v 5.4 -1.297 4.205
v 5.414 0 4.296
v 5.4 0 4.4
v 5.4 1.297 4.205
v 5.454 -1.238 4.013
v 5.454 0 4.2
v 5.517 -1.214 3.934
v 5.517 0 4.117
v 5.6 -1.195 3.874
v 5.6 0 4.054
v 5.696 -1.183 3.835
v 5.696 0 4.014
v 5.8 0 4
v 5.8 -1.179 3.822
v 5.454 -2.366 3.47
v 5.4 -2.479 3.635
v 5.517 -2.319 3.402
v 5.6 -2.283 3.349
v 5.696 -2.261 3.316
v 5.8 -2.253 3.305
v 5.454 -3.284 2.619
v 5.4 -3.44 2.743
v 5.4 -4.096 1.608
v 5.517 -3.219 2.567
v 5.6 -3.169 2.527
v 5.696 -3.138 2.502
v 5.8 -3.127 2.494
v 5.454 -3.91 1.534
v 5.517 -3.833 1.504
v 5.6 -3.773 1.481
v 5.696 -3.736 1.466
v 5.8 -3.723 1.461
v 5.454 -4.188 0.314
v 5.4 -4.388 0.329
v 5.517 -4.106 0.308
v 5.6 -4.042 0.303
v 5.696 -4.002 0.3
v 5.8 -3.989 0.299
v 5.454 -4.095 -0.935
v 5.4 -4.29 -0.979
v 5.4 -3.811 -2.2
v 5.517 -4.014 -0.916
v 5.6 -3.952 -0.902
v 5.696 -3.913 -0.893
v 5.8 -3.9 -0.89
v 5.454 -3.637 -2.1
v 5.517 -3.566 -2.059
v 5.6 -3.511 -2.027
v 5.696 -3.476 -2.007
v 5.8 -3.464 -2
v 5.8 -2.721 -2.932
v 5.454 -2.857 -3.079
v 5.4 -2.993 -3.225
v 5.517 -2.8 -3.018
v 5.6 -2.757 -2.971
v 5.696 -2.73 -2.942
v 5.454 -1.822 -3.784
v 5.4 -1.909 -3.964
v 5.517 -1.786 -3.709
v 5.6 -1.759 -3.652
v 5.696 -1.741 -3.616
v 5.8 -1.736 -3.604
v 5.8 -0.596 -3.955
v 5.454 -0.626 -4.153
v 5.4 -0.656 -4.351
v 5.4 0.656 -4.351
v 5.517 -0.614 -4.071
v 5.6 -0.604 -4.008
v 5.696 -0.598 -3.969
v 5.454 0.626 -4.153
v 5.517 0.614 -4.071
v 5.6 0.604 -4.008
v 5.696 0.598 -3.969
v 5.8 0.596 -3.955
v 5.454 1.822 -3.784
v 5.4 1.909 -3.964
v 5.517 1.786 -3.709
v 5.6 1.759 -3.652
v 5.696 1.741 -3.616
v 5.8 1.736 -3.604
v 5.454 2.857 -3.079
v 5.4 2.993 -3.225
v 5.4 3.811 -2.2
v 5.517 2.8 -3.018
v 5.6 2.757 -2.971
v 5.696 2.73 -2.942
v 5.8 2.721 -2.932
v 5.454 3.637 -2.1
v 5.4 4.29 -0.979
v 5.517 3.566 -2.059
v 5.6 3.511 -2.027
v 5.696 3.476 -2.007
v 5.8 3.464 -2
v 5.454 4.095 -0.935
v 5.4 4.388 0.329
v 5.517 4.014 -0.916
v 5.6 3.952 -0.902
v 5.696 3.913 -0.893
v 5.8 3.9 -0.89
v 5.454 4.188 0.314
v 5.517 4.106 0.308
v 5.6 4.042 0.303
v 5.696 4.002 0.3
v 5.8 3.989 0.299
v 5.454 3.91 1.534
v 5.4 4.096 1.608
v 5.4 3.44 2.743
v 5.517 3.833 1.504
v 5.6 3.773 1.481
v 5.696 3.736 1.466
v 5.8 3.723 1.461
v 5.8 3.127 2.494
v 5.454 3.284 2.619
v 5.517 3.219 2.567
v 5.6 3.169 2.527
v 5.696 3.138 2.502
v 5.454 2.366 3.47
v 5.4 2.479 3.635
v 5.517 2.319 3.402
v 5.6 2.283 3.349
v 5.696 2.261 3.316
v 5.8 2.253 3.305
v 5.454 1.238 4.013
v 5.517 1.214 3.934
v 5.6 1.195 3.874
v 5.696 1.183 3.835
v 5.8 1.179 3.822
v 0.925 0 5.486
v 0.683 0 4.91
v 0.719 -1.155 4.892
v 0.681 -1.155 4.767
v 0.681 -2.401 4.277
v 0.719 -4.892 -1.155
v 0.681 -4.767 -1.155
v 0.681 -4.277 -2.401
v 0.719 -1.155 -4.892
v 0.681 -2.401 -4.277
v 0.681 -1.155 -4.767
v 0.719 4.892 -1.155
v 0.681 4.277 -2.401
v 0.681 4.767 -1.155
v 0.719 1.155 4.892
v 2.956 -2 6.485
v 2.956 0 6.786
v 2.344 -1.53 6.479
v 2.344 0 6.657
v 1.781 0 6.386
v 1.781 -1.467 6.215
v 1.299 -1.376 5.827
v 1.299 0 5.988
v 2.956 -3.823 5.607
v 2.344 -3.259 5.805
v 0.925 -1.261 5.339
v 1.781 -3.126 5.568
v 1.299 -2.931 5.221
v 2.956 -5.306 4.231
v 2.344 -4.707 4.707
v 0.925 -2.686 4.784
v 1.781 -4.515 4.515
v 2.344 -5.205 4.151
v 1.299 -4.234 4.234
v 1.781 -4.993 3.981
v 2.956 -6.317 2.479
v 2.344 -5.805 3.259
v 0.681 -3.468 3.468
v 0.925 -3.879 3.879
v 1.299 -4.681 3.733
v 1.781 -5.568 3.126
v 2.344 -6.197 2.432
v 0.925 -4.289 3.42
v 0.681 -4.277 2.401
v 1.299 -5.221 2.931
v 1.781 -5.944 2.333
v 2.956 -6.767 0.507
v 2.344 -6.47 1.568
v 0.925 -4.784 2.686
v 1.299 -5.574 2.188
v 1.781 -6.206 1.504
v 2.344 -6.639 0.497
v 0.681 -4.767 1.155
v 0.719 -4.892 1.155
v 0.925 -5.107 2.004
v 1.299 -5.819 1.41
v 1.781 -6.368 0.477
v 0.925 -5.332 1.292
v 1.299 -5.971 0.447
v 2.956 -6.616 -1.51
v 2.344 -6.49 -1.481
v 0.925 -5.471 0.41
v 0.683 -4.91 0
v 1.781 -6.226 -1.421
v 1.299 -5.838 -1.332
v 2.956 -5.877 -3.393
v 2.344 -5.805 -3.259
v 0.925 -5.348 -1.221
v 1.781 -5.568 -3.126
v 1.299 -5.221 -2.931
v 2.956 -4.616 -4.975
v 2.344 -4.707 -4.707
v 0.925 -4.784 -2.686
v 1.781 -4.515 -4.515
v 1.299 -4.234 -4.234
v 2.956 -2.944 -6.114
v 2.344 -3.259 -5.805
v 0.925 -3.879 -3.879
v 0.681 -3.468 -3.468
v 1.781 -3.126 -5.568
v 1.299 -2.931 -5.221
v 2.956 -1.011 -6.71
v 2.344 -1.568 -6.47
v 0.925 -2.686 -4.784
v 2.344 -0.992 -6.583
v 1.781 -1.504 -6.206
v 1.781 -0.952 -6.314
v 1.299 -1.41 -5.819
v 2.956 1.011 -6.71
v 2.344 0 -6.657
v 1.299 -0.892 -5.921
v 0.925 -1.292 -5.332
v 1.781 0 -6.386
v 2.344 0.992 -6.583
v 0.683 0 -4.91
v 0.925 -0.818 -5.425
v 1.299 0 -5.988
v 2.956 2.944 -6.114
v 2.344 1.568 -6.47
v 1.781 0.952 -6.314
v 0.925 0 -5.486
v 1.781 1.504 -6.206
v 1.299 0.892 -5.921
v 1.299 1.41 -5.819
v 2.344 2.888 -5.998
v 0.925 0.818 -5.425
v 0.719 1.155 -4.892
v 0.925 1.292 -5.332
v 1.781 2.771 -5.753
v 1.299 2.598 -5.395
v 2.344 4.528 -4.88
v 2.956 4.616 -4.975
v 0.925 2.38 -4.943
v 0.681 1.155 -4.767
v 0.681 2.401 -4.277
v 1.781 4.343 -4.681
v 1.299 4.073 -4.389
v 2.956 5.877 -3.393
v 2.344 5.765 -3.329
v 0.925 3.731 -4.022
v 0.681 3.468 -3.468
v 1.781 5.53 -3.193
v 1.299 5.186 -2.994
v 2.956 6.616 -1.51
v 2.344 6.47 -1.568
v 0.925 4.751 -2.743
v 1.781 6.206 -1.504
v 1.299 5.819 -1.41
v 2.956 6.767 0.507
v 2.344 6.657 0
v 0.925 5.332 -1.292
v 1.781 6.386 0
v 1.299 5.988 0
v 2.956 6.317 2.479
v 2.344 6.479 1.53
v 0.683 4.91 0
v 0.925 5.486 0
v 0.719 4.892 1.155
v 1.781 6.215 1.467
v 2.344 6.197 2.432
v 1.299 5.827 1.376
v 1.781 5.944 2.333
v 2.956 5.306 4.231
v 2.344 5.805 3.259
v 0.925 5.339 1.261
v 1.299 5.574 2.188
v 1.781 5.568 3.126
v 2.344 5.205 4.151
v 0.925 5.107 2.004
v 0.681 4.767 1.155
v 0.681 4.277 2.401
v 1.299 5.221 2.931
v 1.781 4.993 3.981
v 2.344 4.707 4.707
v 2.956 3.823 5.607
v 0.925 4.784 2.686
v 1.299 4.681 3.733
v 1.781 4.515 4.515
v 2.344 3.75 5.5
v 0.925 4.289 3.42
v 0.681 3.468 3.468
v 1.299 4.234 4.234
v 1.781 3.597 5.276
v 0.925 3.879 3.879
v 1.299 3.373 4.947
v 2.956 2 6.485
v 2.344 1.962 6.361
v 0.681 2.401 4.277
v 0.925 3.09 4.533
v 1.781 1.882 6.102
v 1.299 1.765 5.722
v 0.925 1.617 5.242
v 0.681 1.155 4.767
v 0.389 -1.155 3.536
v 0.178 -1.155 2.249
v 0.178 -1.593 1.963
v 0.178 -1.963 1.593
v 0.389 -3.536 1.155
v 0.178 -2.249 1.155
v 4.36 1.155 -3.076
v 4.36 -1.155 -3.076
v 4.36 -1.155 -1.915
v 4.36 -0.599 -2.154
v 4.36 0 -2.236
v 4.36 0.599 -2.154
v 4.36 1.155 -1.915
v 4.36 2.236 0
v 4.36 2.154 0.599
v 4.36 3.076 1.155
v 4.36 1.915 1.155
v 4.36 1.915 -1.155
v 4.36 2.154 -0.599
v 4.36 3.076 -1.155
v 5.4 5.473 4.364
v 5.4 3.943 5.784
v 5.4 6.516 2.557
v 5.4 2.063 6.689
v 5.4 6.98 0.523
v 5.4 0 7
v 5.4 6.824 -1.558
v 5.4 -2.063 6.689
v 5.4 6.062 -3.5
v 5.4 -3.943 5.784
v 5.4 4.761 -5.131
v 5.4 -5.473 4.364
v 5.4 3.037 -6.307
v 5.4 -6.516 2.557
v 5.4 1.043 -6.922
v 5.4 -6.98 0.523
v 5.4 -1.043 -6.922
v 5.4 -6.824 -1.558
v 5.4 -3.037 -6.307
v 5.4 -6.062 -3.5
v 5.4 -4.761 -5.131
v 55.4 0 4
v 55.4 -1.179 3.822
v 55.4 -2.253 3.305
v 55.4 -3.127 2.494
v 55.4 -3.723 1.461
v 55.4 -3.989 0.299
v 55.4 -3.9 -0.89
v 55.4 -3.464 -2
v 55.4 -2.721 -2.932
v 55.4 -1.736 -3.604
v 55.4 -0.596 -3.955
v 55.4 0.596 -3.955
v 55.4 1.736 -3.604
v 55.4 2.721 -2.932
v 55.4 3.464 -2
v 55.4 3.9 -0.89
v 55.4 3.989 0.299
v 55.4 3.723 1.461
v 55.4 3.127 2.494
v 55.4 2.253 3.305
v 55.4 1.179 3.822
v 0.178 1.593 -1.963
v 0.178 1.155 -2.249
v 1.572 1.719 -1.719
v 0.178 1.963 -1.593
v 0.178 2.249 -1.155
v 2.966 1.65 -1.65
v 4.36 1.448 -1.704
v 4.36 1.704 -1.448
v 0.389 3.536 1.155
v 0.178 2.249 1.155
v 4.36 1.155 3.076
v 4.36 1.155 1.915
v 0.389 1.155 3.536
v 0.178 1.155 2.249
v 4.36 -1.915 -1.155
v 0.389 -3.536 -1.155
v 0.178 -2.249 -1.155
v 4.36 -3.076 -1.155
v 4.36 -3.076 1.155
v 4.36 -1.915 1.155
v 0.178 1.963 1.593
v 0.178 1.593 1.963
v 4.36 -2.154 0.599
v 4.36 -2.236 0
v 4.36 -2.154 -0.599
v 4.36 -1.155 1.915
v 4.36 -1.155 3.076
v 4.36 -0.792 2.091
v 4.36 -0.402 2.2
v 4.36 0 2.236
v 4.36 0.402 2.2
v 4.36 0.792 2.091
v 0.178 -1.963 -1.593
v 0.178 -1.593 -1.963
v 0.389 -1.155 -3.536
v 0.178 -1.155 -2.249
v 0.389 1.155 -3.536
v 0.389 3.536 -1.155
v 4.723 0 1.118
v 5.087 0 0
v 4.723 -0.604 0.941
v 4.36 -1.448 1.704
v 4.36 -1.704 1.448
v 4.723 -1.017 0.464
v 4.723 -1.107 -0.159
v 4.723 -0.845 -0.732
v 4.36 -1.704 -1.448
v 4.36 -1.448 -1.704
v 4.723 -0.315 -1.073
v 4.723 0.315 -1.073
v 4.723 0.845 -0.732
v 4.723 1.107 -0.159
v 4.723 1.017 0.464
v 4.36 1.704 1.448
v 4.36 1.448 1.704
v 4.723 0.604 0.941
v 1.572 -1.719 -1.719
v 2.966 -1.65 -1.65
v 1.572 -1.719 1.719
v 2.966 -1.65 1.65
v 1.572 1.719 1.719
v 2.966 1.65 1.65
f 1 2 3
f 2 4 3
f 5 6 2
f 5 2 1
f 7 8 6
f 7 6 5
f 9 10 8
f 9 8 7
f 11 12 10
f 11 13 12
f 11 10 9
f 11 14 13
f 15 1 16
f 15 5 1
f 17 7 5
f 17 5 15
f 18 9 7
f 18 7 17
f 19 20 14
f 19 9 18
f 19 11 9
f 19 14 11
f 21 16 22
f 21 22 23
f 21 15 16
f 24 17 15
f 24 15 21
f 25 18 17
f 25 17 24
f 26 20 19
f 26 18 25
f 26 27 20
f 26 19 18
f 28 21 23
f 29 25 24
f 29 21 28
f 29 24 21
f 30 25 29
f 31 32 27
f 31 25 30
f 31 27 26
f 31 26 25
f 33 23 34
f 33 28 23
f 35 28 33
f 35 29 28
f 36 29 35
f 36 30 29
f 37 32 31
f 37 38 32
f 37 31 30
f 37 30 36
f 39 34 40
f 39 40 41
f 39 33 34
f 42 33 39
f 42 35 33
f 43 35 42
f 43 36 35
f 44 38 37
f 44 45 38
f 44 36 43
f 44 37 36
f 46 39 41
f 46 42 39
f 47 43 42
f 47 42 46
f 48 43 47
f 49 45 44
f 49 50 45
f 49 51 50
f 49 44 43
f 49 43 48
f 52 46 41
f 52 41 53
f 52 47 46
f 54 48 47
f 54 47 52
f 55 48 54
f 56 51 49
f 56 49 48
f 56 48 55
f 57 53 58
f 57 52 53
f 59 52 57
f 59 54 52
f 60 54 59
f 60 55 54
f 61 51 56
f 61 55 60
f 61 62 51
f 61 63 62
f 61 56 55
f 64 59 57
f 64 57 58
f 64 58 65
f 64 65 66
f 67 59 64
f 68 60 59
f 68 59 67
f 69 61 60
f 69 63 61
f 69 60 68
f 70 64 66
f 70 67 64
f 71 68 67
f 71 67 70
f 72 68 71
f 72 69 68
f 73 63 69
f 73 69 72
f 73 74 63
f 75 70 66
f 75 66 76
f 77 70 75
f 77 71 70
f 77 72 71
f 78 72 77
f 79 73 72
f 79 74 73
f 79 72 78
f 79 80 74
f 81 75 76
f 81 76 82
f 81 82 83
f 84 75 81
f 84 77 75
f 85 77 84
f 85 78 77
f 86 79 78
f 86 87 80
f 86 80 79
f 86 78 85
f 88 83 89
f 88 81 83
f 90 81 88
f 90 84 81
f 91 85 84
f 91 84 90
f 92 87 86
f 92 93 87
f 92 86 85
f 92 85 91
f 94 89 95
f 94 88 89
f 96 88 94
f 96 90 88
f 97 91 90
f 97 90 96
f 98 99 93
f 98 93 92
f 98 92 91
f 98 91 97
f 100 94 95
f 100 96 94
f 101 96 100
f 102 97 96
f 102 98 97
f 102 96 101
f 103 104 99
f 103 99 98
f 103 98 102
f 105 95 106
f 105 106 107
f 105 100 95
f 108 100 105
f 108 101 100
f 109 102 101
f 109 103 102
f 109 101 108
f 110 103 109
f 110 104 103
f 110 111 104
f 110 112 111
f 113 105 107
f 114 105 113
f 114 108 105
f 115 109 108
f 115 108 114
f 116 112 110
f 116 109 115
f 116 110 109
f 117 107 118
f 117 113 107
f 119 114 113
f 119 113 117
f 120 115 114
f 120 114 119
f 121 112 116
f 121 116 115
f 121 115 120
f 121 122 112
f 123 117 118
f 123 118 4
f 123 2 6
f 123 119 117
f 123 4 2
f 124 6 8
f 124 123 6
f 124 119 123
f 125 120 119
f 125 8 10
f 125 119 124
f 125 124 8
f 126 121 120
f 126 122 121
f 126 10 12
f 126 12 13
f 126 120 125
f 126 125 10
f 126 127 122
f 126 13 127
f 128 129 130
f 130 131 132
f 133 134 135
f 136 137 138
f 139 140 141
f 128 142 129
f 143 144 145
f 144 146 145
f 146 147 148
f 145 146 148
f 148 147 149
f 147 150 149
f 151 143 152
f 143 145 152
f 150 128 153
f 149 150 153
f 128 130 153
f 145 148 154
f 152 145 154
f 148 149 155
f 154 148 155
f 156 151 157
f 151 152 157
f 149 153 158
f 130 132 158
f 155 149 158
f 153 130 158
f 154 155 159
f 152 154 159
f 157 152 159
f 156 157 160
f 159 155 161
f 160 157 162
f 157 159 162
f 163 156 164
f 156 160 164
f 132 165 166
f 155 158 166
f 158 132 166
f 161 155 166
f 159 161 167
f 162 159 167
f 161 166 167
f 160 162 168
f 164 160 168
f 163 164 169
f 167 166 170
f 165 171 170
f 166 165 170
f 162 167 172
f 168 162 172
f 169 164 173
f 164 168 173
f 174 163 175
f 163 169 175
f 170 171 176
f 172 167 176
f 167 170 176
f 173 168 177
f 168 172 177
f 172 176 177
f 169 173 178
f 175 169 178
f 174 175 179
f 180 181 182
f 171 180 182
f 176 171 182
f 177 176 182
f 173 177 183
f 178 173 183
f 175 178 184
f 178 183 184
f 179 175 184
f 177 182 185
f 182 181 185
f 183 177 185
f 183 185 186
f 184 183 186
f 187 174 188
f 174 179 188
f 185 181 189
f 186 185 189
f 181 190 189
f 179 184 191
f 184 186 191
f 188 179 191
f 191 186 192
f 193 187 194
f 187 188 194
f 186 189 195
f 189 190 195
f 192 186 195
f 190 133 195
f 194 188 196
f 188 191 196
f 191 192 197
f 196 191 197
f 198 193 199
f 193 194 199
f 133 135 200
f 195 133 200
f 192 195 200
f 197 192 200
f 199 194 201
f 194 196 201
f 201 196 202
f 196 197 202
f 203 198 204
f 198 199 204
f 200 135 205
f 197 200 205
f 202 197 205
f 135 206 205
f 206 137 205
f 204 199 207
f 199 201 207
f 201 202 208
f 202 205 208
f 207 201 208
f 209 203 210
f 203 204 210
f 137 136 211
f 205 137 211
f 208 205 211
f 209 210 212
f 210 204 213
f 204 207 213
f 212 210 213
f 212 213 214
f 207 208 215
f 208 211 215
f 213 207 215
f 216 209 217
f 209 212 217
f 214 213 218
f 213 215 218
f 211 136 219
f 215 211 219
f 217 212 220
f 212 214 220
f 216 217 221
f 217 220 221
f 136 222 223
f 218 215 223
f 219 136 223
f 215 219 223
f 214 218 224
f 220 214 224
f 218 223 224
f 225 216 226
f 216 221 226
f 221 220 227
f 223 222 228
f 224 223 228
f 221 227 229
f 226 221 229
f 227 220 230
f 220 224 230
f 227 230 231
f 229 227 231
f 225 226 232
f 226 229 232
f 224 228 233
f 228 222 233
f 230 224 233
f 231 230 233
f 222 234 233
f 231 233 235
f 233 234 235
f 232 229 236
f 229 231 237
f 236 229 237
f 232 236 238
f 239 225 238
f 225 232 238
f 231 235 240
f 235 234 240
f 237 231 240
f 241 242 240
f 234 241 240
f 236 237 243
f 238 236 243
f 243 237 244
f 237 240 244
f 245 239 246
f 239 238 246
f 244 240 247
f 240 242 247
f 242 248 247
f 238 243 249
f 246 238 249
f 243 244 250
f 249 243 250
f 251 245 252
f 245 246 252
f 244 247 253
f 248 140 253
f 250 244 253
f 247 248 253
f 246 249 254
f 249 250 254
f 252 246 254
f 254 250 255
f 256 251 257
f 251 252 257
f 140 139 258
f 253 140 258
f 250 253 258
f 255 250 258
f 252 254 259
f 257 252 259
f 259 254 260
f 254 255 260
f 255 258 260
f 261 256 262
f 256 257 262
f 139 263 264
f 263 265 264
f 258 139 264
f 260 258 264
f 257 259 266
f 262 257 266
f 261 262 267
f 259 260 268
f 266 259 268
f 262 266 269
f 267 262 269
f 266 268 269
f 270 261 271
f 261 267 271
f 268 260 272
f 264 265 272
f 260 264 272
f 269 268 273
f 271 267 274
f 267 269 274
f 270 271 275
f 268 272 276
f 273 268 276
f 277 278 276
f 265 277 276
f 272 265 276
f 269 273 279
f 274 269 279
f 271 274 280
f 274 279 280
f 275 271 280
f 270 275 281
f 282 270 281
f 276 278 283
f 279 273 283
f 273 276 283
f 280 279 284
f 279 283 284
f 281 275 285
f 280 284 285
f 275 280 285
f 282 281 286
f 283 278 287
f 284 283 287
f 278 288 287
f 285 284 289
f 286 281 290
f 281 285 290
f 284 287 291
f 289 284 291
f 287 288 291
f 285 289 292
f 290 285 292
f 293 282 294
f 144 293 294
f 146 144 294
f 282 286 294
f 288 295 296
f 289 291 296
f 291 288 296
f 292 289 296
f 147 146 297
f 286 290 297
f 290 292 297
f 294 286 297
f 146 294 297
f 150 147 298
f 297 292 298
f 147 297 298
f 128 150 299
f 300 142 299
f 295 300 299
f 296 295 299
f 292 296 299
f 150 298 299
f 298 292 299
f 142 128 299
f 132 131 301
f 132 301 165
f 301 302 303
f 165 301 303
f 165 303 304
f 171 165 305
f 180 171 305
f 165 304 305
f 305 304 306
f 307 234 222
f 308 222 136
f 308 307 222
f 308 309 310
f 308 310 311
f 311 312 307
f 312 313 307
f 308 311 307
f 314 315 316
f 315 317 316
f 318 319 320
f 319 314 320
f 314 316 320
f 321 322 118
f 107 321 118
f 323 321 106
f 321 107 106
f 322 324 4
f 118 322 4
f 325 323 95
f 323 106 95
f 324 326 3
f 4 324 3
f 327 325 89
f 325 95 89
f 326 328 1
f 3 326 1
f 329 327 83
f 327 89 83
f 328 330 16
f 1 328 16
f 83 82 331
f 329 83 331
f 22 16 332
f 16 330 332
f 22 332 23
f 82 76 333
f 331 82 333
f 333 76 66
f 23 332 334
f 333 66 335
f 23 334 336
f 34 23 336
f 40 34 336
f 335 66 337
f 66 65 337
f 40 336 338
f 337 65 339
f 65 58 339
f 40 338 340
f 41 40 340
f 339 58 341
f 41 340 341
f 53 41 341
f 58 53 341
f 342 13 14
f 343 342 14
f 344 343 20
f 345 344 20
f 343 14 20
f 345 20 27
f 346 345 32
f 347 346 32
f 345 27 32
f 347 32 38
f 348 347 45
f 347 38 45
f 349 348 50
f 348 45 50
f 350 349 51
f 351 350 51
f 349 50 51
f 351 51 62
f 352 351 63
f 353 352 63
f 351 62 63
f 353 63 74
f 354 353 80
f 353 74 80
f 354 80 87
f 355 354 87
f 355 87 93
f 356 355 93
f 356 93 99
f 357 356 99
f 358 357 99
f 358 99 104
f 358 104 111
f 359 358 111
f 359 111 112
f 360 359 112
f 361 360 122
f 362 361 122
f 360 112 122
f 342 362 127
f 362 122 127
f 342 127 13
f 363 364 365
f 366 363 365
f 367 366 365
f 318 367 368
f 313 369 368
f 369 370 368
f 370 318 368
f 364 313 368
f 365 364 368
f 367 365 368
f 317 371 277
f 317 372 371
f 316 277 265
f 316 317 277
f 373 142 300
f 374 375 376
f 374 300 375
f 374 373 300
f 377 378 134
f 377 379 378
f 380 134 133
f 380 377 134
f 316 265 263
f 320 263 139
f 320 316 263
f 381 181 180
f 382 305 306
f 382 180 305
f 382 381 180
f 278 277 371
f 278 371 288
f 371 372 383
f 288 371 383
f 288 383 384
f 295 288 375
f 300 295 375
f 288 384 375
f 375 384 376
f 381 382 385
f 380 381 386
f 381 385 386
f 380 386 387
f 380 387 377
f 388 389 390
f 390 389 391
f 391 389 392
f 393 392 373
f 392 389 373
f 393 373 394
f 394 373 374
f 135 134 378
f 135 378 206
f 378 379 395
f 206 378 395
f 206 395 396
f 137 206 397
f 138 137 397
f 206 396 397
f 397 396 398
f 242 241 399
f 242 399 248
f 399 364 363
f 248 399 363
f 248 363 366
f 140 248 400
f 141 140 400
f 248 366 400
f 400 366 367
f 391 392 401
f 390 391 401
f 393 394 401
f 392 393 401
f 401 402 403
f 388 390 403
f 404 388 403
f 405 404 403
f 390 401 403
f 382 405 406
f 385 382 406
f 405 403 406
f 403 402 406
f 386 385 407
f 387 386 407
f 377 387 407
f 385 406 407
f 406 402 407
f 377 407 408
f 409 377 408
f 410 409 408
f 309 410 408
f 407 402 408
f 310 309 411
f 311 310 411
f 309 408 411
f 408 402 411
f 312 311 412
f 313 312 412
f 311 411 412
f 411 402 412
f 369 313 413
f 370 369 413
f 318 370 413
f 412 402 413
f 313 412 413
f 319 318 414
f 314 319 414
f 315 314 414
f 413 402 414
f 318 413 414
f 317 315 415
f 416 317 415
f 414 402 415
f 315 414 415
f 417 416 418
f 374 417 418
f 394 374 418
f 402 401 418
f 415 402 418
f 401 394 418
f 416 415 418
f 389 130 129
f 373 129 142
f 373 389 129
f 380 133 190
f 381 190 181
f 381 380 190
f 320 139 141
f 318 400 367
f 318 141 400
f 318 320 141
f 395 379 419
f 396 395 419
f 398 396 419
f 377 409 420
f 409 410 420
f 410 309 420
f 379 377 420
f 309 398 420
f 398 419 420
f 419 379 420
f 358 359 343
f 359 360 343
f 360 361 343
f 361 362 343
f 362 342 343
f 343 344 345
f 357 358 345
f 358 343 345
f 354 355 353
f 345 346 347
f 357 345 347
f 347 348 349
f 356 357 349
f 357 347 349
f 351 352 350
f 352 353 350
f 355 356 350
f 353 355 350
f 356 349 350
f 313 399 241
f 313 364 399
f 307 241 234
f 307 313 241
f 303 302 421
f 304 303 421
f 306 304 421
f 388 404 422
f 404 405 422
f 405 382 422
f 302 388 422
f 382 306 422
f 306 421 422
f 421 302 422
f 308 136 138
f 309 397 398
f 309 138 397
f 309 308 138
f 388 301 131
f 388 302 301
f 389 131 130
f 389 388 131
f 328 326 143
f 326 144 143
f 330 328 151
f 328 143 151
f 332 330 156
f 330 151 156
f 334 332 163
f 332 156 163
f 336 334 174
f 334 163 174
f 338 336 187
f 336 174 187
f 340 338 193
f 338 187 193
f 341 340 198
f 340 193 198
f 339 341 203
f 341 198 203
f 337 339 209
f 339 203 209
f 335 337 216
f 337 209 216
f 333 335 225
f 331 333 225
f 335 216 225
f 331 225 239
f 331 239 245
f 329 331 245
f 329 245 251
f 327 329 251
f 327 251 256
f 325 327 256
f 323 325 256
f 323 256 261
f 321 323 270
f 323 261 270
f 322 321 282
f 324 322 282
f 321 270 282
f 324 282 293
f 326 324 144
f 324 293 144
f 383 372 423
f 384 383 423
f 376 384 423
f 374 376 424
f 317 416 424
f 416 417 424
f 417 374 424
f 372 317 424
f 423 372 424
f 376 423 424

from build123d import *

# Parameters (mm, degrees)
FILLET1_R    = 0.4
RECPAT_COUNT = 2
RECPAT_ANGLE = 90


with BuildPart() as part:
    # BodySke → BaseBody (revolve)
    with BuildSketch(Plane.XY, mode=Mode.PRIVATE) as basebody_sk:
        with BuildLine():
            Line((5.4, 4), (5.4, 7))
            Line((5.4, 7), (2.956076559, 6.786184404))
            ThreePointArc((2.956076559, 6.786184404), (1.52557938, 6.199578276), (0.681056287, 4.904506975))
            ThreePointArc((0.681056287, 4.904506975), (0.171077054, 2.475784034), (0, 0))
            Line((0, 0), (55.4, 0))
            Line((55.4, 0), (55.4, 4))
            Line((55.4, 4), (5.4, 4))
        make_face()
    revolve(basebody_sk.sketch.rotate(Axis((0, 0, 0), (1, 0, 0)), 90), axis=Axis((0, 0, 0), (1, 0, 0)))

    # Fillet1
    fillet1_edges = [part.edges().sort_by_distance(p)[0] for p in [
        (5.4, 0, -4),
    ]]
    fillet(fillet1_edges, radius=FILLET1_R)

    # RecSkeTop → Recess section 0
    with BuildSketch(Plane(origin=(0, 0, 0), x_dir=(0, 0, -1), z_dir=(1, 0, 0))):
        with BuildLine():
            Line((-1.155, 5.25), (1.155, 5.25))
            Line((1.155, 5.25), (1.155, -5.25))
            Line((1.155, -5.25), (-1.155, -5.25))
            Line((-1.155, -5.25), (-1.155, 5.25))
        make_face()
    # RecSkeBot → Recess section 1
    with BuildSketch(Plane(origin=(4.36, 0, 0), x_dir=(0, 0, -1), z_dir=(1, 0, 0))):
        with BuildLine():
            Line((-1.155, 3.076184552), (1.155, 3.076184552))
            Line((1.155, 3.076184552), (1.155, -3.076184552))
            Line((1.155, -3.076184552), (-1.155, -3.076184552))
            Line((-1.155, -3.076184552), (-1.155, 3.076184552))
        make_face()
    recess = loft(mode=Mode.SUBTRACT)

    # RecPat: Recess ×2 about axis
    recpat_axis = Axis((0, 0, 0), (1, 0, 0))
    for i in range(1, RECPAT_COUNT):
        add(recess.rotate(recpat_axis, i * RECPAT_ANGLE / (RECPAT_COUNT - 1)), mode=Mode.SUBTRACT)

    # RecCorSke → RecessCore (revolve, cut)
    with BuildSketch(Plane.XY, mode=Mode.PRIVATE) as recesscore_sk:
        Polygon((0, 0), (0, 2.541), (4.36, 2.2361191), (5.086559139, 0), align=None)
    revolve(recesscore_sk.sketch.rotate(Axis((0, 0, 0), (1, 0, 0)), 90), axis=Axis((0, 0, 0), (1, 0, 0)), mode=Mode.SUBTRACT)


solid = part.part
